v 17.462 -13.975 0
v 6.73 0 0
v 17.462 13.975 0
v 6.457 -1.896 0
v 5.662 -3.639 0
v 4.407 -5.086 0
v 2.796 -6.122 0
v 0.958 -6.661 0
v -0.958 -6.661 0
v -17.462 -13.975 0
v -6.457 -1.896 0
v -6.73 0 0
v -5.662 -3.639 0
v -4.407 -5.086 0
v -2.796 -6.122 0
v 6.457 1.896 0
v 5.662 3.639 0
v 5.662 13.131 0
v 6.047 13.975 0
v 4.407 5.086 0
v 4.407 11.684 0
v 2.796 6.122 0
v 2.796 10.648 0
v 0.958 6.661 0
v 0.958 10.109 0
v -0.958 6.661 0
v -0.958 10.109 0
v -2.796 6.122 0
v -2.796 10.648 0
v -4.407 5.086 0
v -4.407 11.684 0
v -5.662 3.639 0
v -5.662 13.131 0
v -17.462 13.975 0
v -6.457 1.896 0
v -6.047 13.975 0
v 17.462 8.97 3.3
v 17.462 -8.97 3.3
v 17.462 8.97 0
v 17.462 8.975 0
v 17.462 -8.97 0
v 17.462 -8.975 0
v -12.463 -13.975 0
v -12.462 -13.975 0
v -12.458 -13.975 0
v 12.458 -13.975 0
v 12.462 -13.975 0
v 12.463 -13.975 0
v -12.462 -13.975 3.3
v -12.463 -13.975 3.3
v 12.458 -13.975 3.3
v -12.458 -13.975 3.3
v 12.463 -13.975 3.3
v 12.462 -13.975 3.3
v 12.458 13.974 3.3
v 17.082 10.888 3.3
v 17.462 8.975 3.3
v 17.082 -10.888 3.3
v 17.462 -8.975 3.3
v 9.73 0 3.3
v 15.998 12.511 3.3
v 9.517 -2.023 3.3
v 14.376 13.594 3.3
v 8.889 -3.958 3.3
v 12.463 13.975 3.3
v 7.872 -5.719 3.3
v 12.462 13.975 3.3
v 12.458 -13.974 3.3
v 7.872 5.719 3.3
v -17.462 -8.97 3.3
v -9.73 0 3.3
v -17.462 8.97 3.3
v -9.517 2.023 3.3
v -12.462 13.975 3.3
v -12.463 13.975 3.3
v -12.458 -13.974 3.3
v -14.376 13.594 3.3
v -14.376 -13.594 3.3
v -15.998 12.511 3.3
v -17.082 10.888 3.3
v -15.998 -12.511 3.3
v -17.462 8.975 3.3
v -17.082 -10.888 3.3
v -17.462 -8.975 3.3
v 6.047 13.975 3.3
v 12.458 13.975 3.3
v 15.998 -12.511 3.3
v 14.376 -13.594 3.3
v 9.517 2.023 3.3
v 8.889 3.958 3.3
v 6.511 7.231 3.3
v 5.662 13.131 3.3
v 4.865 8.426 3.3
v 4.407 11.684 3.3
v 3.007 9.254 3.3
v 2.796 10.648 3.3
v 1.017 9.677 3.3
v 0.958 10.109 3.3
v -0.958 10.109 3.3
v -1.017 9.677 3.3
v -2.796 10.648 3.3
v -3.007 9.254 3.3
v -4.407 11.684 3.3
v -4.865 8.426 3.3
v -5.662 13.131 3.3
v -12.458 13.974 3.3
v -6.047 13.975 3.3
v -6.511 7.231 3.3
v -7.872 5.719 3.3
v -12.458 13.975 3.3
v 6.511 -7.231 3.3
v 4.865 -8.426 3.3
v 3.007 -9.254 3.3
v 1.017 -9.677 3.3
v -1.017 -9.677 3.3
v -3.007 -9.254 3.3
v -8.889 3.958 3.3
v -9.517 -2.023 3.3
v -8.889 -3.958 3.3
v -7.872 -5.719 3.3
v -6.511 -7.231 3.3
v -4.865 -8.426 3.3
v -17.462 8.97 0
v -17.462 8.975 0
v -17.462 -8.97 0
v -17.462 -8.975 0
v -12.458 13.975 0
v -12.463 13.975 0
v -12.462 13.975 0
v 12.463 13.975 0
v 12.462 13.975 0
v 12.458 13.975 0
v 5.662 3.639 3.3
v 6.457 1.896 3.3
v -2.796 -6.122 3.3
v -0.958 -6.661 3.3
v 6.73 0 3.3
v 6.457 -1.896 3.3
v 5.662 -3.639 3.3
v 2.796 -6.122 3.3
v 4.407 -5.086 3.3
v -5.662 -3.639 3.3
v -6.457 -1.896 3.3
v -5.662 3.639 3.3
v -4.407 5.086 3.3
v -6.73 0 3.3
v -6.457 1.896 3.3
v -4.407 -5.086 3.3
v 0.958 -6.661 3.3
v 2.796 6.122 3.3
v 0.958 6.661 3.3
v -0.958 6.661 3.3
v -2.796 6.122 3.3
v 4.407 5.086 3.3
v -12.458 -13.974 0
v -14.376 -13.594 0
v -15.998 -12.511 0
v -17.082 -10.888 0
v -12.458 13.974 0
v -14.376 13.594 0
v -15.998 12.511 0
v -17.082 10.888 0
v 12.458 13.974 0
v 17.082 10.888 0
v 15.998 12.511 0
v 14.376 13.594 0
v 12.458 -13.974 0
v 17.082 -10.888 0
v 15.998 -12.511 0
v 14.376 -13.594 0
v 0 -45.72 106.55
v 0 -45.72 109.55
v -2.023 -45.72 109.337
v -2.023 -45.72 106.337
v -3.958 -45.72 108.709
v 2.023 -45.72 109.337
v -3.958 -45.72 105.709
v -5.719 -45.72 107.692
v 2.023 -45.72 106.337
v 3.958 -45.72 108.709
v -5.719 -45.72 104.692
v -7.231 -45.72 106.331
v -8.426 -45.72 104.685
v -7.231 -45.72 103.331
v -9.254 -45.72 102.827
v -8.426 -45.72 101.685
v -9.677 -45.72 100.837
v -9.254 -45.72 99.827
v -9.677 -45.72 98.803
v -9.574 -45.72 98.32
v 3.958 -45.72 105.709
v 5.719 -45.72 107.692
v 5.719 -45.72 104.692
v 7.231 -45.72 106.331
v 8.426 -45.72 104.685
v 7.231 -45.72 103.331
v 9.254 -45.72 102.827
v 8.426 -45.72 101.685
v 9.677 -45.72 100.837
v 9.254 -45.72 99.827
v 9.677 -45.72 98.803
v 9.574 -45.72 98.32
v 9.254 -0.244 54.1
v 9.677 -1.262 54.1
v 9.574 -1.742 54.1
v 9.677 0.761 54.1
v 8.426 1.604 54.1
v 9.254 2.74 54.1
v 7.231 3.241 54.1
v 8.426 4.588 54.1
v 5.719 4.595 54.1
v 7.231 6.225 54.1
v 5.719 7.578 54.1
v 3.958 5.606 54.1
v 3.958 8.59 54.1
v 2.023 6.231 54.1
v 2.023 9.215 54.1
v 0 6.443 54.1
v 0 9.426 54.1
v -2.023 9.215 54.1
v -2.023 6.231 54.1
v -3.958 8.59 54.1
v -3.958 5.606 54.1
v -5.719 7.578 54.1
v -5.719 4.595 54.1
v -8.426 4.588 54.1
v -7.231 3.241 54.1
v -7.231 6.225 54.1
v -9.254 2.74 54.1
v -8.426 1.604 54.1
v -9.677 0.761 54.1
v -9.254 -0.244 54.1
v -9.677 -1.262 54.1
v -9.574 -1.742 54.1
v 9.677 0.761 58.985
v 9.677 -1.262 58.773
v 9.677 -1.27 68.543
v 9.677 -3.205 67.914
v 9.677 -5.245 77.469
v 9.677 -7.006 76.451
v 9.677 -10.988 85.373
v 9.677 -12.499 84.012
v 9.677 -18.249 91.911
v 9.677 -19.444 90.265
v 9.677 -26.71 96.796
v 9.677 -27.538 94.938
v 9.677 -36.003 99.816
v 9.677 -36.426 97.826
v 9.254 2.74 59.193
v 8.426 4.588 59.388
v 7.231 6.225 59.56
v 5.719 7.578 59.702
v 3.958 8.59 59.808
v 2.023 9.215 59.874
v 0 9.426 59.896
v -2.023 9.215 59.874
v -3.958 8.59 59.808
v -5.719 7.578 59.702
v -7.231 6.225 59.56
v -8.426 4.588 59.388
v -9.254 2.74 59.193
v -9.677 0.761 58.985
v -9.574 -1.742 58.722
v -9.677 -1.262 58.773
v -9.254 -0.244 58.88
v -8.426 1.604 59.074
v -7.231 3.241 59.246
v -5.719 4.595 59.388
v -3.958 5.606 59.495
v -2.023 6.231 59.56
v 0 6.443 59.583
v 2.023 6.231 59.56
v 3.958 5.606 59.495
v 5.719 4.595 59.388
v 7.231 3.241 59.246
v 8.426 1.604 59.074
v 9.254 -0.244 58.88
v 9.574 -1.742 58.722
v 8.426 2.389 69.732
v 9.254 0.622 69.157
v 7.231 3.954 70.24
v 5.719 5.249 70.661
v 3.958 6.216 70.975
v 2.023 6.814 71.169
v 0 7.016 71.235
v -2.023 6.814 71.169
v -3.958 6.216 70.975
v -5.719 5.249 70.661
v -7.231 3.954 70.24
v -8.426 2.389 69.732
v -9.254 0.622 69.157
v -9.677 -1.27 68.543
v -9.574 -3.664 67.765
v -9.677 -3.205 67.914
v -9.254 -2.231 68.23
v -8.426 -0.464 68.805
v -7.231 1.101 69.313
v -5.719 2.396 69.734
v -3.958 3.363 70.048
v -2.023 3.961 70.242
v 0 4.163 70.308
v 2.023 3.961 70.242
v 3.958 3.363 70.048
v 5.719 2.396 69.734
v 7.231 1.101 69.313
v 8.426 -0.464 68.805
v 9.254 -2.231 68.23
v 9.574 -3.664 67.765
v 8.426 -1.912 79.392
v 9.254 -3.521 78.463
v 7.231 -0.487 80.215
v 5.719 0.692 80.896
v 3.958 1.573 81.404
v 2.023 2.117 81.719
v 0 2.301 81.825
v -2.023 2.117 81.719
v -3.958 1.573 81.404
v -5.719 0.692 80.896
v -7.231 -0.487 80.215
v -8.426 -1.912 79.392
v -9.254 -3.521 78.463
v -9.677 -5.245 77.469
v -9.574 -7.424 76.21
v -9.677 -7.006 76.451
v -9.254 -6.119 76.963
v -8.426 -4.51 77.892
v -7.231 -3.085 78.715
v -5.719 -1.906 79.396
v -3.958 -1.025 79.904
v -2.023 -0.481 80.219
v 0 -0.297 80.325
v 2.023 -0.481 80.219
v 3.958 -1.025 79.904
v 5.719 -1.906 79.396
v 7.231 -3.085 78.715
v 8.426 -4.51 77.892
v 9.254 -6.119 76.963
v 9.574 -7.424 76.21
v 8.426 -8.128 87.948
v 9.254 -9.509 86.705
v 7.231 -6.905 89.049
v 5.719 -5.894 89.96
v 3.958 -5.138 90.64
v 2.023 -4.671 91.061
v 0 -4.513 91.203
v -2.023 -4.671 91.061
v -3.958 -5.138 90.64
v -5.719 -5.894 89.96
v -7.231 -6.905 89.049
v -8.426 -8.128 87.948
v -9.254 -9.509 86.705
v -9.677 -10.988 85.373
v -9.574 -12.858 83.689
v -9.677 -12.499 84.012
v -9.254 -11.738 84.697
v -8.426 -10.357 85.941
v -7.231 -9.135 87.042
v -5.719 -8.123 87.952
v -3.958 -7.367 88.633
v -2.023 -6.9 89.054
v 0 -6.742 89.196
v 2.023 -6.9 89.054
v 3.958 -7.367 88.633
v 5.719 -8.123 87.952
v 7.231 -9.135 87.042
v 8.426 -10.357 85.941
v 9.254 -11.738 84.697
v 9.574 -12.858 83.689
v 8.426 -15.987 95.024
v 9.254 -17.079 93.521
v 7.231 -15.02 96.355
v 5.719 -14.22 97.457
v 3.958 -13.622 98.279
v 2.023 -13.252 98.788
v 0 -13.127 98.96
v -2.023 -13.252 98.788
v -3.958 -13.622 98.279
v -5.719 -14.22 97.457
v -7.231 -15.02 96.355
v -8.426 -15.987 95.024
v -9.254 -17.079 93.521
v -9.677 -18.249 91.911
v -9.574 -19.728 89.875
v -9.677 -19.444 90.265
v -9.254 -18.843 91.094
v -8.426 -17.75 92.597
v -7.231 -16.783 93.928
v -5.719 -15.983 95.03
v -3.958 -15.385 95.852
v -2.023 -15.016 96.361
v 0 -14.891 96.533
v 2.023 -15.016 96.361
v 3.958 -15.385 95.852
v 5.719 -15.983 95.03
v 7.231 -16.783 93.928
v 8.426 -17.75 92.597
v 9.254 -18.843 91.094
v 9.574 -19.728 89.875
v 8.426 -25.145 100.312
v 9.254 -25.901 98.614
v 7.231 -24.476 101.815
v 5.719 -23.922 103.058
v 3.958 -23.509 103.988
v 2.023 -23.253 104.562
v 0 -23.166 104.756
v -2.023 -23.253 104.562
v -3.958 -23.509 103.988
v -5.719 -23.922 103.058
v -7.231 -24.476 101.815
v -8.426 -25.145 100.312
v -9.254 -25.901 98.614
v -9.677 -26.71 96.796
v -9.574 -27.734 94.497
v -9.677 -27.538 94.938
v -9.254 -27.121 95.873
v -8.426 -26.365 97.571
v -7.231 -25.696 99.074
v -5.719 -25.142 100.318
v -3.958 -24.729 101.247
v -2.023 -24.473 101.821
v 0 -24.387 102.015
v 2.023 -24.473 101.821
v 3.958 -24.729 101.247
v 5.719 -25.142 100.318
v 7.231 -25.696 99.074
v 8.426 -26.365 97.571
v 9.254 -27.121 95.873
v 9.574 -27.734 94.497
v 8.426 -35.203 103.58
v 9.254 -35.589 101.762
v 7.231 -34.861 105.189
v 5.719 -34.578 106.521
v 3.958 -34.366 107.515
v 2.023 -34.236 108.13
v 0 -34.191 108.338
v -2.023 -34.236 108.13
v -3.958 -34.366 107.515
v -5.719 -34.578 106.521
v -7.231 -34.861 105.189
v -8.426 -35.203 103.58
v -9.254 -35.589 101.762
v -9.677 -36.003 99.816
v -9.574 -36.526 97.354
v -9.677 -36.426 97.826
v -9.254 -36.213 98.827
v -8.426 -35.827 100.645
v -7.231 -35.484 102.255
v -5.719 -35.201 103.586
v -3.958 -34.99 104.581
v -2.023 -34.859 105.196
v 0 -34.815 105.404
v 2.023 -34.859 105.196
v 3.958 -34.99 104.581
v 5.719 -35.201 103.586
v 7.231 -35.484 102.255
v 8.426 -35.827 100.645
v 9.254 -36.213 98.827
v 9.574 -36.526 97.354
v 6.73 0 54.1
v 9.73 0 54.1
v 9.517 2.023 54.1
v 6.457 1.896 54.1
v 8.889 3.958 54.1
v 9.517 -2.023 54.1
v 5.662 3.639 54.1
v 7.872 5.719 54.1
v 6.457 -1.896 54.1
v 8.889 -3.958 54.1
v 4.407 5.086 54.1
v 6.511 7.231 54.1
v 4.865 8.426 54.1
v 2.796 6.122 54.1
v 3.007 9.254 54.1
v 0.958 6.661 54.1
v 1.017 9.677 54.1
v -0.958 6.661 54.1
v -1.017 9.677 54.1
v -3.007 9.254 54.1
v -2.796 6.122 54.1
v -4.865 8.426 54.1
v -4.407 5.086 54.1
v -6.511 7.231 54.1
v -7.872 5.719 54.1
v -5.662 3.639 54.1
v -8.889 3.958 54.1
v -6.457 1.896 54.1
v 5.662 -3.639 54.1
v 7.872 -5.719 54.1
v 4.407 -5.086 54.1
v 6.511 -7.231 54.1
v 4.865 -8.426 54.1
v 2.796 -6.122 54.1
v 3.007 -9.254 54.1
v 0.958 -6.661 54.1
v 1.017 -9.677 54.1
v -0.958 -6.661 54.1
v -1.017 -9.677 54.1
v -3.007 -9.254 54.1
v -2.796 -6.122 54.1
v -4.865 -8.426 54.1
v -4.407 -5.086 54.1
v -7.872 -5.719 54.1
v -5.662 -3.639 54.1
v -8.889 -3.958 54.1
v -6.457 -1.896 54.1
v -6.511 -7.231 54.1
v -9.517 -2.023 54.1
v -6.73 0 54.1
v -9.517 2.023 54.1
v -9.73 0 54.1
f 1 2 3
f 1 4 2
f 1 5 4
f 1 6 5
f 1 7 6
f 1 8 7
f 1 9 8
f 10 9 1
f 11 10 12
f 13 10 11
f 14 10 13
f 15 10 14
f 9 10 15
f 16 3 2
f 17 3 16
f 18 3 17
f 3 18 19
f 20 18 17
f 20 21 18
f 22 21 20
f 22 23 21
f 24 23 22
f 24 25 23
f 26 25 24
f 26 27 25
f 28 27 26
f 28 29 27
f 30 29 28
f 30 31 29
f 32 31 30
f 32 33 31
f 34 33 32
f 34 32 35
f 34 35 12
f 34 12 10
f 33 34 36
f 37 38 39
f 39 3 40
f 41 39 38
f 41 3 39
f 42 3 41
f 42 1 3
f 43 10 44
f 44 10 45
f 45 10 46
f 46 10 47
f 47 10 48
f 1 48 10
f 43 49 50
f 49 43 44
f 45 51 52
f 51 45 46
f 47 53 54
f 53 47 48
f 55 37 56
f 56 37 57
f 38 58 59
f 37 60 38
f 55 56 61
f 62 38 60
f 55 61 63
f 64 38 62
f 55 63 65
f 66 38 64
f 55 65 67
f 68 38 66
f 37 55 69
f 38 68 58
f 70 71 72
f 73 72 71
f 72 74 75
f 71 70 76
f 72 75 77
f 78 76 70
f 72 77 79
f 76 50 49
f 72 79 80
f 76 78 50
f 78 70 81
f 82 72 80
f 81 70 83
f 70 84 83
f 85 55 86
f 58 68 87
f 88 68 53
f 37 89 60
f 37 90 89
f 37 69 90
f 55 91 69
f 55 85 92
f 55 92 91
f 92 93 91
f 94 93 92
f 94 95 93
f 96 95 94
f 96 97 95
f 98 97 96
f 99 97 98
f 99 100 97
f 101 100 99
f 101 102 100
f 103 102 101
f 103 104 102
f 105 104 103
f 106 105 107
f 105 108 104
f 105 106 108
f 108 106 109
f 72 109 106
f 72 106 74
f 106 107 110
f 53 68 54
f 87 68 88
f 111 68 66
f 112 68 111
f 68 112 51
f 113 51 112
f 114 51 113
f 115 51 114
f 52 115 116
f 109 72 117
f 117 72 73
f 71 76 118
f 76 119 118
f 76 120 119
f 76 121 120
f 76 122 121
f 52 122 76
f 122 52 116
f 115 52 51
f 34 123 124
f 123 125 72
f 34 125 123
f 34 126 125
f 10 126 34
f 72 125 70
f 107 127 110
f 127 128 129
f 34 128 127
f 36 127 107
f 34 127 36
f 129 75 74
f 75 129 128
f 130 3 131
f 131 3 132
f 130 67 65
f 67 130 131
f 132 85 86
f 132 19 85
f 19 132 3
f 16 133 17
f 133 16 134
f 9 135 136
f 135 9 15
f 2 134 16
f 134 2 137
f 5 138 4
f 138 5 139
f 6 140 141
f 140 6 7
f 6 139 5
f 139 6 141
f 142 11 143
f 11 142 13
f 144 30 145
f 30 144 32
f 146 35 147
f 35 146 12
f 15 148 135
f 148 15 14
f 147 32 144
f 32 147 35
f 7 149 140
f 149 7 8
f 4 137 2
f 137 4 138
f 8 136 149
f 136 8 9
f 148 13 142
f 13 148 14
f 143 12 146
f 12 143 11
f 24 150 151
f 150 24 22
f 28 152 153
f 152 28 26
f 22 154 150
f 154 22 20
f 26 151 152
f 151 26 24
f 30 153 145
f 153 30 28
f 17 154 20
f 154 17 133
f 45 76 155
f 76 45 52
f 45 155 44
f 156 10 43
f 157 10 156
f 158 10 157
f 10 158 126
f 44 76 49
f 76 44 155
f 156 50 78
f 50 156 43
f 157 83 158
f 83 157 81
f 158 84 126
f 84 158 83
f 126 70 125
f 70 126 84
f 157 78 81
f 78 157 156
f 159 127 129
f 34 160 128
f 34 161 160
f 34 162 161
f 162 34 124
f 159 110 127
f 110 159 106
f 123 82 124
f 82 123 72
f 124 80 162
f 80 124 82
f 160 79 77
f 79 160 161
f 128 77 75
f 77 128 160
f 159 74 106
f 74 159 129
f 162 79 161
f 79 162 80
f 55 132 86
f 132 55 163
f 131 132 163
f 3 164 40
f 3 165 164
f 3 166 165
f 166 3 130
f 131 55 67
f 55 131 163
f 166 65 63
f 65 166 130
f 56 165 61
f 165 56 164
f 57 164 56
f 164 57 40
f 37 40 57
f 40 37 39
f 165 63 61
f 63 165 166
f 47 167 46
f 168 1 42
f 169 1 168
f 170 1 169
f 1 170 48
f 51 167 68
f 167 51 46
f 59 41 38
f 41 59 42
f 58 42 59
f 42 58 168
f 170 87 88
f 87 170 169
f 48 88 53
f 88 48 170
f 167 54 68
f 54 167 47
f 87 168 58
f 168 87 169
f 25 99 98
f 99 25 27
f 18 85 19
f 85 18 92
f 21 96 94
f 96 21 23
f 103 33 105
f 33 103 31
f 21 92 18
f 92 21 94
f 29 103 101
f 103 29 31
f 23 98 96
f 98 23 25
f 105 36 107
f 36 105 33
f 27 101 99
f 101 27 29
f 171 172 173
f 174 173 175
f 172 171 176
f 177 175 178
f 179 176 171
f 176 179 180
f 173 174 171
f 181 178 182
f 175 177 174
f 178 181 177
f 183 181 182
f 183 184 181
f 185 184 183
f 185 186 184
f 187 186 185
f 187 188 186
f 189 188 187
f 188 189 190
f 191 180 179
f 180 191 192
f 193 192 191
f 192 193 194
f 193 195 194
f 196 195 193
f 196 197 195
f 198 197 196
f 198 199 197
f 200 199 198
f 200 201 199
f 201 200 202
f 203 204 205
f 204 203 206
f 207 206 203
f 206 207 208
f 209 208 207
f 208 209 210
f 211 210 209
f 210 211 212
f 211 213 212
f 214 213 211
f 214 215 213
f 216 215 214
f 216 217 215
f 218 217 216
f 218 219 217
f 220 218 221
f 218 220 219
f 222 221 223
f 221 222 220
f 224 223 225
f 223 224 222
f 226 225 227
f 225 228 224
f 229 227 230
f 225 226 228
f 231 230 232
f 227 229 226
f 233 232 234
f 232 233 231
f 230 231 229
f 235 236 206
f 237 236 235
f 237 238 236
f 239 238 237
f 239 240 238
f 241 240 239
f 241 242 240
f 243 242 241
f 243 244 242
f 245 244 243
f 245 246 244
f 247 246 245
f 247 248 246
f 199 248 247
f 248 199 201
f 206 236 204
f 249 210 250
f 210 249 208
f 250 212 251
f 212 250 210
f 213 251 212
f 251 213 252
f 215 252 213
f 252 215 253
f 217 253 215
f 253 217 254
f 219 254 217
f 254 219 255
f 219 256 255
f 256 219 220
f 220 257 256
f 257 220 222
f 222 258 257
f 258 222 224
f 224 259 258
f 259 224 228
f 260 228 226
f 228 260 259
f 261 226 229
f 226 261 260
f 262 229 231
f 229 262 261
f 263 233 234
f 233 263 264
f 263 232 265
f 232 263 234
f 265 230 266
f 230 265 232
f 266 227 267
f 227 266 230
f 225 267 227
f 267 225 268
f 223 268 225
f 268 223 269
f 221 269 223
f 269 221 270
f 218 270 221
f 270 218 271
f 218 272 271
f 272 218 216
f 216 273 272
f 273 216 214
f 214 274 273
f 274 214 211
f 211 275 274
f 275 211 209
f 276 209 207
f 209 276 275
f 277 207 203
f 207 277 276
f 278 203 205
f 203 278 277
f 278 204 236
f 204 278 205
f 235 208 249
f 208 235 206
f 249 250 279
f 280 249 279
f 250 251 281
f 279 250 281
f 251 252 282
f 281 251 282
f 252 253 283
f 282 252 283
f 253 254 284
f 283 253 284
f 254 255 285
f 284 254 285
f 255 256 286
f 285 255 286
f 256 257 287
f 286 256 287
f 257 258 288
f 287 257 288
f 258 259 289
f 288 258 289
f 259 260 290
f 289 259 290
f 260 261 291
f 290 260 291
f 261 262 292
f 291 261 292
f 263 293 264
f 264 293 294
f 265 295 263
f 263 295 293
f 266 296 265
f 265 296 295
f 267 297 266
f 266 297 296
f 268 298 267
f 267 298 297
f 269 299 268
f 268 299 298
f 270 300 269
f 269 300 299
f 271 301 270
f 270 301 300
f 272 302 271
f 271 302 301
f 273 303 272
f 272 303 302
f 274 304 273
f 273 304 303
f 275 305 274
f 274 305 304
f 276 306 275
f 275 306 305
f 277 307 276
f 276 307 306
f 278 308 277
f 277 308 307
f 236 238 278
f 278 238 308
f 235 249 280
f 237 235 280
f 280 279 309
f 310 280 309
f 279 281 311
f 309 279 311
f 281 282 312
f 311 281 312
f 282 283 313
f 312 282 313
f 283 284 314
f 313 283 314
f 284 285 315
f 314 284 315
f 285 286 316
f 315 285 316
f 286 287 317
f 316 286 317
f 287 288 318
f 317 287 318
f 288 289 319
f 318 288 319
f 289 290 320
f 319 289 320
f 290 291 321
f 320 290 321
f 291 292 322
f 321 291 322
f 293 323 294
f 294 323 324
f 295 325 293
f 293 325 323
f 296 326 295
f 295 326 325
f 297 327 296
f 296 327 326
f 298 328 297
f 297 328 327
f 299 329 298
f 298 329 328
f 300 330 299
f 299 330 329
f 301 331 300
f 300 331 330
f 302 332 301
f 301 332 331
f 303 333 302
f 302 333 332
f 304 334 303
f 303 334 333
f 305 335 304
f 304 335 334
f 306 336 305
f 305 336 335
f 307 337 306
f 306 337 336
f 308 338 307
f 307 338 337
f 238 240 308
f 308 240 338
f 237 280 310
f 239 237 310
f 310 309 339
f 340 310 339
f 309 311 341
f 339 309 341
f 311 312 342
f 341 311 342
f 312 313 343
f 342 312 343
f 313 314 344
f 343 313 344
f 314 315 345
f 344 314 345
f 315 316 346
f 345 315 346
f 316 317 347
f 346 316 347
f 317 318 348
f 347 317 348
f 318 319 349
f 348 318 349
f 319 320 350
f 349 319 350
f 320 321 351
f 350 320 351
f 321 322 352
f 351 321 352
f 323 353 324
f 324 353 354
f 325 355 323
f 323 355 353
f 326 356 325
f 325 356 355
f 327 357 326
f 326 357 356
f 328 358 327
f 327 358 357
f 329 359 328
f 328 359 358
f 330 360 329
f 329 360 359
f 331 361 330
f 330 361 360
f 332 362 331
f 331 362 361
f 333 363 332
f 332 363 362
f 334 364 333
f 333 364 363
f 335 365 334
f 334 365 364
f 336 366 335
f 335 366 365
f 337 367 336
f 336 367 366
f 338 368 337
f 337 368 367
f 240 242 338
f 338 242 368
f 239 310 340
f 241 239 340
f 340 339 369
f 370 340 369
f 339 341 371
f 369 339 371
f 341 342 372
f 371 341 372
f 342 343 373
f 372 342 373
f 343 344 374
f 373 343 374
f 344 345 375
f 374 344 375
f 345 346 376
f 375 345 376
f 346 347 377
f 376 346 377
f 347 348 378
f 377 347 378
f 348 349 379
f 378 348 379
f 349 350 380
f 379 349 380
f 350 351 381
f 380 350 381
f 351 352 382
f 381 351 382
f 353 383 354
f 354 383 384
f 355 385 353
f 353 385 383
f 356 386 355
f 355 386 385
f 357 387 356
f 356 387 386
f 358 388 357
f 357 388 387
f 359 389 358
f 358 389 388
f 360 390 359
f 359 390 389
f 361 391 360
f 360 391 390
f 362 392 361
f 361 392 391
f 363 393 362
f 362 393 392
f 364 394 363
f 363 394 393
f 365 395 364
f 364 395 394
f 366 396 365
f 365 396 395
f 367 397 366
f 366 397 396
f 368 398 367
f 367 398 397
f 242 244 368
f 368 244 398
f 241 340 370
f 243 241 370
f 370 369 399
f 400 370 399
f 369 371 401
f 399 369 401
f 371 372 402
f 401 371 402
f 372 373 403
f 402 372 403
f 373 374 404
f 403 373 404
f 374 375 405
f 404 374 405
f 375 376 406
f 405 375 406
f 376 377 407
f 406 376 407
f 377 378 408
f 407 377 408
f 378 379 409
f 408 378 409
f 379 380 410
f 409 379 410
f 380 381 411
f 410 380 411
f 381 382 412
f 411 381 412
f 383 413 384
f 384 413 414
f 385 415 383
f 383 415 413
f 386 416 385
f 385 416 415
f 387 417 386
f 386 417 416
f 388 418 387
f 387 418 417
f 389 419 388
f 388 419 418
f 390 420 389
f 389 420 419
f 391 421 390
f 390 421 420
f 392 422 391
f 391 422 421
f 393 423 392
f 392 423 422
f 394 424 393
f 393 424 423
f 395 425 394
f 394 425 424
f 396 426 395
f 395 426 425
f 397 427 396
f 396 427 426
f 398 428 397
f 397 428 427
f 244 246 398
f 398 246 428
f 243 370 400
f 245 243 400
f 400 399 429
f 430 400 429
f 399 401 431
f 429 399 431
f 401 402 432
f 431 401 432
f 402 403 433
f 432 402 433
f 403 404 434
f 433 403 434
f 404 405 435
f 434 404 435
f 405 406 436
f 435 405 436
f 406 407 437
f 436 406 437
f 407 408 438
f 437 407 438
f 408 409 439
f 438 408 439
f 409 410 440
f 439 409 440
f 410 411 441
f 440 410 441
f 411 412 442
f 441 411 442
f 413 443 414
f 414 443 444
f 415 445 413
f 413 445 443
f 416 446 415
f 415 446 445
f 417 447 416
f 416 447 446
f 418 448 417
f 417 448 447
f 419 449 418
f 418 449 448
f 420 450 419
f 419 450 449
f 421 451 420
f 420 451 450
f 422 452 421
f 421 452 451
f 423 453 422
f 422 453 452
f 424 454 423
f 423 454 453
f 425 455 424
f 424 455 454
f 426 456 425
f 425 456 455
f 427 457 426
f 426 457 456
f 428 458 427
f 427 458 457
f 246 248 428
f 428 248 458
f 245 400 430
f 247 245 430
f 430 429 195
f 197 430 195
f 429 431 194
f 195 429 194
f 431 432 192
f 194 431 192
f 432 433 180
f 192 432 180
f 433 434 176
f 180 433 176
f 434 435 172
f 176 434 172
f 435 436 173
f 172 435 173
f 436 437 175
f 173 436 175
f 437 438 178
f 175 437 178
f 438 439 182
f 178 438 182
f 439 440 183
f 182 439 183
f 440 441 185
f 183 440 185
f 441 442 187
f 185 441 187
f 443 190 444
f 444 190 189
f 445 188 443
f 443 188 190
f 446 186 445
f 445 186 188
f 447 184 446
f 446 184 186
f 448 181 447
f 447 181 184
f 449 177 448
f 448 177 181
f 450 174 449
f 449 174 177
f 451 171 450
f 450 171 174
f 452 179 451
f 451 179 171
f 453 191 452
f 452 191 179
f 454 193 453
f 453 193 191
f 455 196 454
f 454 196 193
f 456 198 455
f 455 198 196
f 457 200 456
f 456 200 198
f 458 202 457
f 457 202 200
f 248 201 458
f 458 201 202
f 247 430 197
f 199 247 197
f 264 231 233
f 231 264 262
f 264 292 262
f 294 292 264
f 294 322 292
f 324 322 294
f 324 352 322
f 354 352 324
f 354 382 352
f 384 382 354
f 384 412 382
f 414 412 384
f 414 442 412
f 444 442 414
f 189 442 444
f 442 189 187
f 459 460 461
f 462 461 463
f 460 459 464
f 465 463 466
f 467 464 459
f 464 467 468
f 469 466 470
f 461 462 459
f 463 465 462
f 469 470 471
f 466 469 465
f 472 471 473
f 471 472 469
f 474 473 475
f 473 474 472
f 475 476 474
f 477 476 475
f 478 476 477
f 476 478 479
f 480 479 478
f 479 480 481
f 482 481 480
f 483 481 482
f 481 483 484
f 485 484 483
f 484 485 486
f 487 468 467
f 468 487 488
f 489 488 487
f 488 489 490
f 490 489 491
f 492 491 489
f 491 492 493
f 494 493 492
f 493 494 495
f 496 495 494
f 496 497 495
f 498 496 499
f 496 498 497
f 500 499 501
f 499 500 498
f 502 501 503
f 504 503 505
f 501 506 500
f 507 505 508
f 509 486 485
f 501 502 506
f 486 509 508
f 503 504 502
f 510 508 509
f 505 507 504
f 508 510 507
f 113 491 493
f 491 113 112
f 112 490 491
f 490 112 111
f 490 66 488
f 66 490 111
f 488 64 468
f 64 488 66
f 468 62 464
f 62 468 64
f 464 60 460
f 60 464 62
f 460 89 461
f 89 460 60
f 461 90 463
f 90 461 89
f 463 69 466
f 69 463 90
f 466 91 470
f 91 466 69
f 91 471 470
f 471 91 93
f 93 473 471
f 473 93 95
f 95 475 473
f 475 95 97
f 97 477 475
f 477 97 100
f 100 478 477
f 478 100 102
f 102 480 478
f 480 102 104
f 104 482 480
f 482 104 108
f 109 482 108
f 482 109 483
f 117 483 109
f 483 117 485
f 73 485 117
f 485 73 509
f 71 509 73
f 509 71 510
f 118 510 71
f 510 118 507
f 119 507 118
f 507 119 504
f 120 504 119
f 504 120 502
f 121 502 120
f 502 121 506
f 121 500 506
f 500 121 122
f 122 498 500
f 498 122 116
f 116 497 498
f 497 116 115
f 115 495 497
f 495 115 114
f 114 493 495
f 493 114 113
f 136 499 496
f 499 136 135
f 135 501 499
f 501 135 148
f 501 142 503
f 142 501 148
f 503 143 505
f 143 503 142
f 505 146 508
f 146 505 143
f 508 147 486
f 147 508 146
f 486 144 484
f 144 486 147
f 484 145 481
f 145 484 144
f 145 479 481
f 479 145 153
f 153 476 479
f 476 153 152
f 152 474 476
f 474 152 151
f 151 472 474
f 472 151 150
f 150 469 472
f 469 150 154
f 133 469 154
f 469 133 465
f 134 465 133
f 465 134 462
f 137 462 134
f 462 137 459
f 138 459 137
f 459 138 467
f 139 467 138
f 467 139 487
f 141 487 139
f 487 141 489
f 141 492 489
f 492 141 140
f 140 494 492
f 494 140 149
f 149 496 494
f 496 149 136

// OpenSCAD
//Numbers are unitless, but can be interpreted as units in Skeinforge.  Using mm for all these measurements.

// CRITICAL VARS
plateHoleD = 13.46;
tubeP1Length = 50.8;

// Variables
plateW = 34.925;
plateH = 27.95;
plateT = 3.3;
wallThickness = 3;
tubeOuterRad = plateHoleD/2+wallThickness;
angleRadius = 45.72;
partialAngle = 90;


// Front Plate
difference(){

	// Plate + hole
	difference(){
		linear_extrude(height = plateT, center = false, scale = 1.0)
		polygon(points = [[plateW/2, plateH/2], [plateW/2, -plateH/2], [-plateW/2, -plateH/2],[-plateW/2, plateH/2]]);
			
		linear_extrude(height = plateT, center = false, scale = 1.0)
		circle(plateHoleD/2);
	}


	// Fillet #1
	translate([-plateW/2,-plateH/2,plateT/2])
	fillet(5,plateT)
	difference(){
		linear_extrude(height = plateT, center = false, scale = 1.0)
		polygon(points = [[plateW/2, plateH/2], [plateW/2, -plateH/2], [-plateW/2, -plateH/2],[-plateW/2, plateH/2]]);
			
		linear_extrude(height = plateT, center = false, scale = 1.0)
		circle(plateHoleD/2);
	}

	// Fillet #2
	translate([-plateW/2,plateH/2,plateT/2])
	rotate([0,0,-90])
	fillet(5,plateT)
	difference(){
		linear_extrude(height = plateT, center = false, scale = 1.0)
		polygon(points = [[plateW/2, plateH/2], [plateW/2, -plateH/2], [-plateW/2, -plateH/2],[-plateW/2, plateH/2]]);
			
		linear_extrude(height = plateT, center = false, scale = 1.0)
		circle(plateHoleD/2);
	}

	// Fillet #3
	translate([plateW/2,plateH/2,plateT/2])
	rotate([0,0,180])
	fillet(5,plateT)
	difference(){
		linear_extrude(height = plateT, center = false)
		polygon(points = [[plateW/2, plateH/2], [plateW/2, -plateH/2], [-plateW/2, -plateH/2],[-plateW/2, plateH/2]]);
			
		linear_extrude(height = plateT, center = false)
		circle(plateHoleD/2);
	}

	// Fillet #4
	translate([plateW/2,-plateH/2,plateT/2])
	rotate([0,0,90])
	fillet(5,plateT)
	difference(){
		linear_extrude(height = plateT, center = false)
		polygon(points = [[plateW/2, plateH/2], [plateW/2, -plateH/2], [-plateW/2, -plateH/2],[-plateW/2, plateH/2]]);
			
		linear_extrude(height = plateT, center = false)
		circle(plateHoleD/2);
	}

	// Dimple on top
	translate([0,0.6*plateH,0])
	linear_extrude(height = plateT, center = false)
	circle((plateHoleD/2));

}


// Tube Part 1
translate([0,0,plateT])
linear_extrude(height = tubeP1Length, center = false, scale = 1.0)
difference(){
	circle(tubeOuterRad);
	circle(plateHoleD/2);
}


// Tube Part 2
translate([0,-angleRadius,plateT+tubeP1Length])
rotate([0,-90,0])
partial_rotate_extrude(partialAngle, angleRadius, 10)
difference(){
	circle(tubeOuterRad);
	translate([-wallThickness,0,0]) circle(tubeOuterRad);
}


/******* MODULES *******/

module pie_slice(radius, angle, step) {
	for(theta = [0:step:angle-step]) {
		rotate([0,0,0]) linear_extrude(height = radius*2, center=true)
		polygon( points = [[0,0],[radius * cos(theta+step) ,radius * sin(theta+step)],[radius*cos(theta),radius*sin(theta)]]);
	}
}

module partial_rotate_extrude(angle, radius, convex) {
	intersection () {
		rotate_extrude(convexity=convex) translate([radius,0,0]) child(0);
		pie_slice(radius*2, angle, angle/5);
	}
}

module fillet(r, h) {
    translate([r / 2, r / 2, 0])

        difference() {
            cube([r + 0.01, r + 0.01, h], center = true);

            translate([r/2, r/2, 0])
                cylinder(r = r, h = h + 1, center = true);

        }
}
